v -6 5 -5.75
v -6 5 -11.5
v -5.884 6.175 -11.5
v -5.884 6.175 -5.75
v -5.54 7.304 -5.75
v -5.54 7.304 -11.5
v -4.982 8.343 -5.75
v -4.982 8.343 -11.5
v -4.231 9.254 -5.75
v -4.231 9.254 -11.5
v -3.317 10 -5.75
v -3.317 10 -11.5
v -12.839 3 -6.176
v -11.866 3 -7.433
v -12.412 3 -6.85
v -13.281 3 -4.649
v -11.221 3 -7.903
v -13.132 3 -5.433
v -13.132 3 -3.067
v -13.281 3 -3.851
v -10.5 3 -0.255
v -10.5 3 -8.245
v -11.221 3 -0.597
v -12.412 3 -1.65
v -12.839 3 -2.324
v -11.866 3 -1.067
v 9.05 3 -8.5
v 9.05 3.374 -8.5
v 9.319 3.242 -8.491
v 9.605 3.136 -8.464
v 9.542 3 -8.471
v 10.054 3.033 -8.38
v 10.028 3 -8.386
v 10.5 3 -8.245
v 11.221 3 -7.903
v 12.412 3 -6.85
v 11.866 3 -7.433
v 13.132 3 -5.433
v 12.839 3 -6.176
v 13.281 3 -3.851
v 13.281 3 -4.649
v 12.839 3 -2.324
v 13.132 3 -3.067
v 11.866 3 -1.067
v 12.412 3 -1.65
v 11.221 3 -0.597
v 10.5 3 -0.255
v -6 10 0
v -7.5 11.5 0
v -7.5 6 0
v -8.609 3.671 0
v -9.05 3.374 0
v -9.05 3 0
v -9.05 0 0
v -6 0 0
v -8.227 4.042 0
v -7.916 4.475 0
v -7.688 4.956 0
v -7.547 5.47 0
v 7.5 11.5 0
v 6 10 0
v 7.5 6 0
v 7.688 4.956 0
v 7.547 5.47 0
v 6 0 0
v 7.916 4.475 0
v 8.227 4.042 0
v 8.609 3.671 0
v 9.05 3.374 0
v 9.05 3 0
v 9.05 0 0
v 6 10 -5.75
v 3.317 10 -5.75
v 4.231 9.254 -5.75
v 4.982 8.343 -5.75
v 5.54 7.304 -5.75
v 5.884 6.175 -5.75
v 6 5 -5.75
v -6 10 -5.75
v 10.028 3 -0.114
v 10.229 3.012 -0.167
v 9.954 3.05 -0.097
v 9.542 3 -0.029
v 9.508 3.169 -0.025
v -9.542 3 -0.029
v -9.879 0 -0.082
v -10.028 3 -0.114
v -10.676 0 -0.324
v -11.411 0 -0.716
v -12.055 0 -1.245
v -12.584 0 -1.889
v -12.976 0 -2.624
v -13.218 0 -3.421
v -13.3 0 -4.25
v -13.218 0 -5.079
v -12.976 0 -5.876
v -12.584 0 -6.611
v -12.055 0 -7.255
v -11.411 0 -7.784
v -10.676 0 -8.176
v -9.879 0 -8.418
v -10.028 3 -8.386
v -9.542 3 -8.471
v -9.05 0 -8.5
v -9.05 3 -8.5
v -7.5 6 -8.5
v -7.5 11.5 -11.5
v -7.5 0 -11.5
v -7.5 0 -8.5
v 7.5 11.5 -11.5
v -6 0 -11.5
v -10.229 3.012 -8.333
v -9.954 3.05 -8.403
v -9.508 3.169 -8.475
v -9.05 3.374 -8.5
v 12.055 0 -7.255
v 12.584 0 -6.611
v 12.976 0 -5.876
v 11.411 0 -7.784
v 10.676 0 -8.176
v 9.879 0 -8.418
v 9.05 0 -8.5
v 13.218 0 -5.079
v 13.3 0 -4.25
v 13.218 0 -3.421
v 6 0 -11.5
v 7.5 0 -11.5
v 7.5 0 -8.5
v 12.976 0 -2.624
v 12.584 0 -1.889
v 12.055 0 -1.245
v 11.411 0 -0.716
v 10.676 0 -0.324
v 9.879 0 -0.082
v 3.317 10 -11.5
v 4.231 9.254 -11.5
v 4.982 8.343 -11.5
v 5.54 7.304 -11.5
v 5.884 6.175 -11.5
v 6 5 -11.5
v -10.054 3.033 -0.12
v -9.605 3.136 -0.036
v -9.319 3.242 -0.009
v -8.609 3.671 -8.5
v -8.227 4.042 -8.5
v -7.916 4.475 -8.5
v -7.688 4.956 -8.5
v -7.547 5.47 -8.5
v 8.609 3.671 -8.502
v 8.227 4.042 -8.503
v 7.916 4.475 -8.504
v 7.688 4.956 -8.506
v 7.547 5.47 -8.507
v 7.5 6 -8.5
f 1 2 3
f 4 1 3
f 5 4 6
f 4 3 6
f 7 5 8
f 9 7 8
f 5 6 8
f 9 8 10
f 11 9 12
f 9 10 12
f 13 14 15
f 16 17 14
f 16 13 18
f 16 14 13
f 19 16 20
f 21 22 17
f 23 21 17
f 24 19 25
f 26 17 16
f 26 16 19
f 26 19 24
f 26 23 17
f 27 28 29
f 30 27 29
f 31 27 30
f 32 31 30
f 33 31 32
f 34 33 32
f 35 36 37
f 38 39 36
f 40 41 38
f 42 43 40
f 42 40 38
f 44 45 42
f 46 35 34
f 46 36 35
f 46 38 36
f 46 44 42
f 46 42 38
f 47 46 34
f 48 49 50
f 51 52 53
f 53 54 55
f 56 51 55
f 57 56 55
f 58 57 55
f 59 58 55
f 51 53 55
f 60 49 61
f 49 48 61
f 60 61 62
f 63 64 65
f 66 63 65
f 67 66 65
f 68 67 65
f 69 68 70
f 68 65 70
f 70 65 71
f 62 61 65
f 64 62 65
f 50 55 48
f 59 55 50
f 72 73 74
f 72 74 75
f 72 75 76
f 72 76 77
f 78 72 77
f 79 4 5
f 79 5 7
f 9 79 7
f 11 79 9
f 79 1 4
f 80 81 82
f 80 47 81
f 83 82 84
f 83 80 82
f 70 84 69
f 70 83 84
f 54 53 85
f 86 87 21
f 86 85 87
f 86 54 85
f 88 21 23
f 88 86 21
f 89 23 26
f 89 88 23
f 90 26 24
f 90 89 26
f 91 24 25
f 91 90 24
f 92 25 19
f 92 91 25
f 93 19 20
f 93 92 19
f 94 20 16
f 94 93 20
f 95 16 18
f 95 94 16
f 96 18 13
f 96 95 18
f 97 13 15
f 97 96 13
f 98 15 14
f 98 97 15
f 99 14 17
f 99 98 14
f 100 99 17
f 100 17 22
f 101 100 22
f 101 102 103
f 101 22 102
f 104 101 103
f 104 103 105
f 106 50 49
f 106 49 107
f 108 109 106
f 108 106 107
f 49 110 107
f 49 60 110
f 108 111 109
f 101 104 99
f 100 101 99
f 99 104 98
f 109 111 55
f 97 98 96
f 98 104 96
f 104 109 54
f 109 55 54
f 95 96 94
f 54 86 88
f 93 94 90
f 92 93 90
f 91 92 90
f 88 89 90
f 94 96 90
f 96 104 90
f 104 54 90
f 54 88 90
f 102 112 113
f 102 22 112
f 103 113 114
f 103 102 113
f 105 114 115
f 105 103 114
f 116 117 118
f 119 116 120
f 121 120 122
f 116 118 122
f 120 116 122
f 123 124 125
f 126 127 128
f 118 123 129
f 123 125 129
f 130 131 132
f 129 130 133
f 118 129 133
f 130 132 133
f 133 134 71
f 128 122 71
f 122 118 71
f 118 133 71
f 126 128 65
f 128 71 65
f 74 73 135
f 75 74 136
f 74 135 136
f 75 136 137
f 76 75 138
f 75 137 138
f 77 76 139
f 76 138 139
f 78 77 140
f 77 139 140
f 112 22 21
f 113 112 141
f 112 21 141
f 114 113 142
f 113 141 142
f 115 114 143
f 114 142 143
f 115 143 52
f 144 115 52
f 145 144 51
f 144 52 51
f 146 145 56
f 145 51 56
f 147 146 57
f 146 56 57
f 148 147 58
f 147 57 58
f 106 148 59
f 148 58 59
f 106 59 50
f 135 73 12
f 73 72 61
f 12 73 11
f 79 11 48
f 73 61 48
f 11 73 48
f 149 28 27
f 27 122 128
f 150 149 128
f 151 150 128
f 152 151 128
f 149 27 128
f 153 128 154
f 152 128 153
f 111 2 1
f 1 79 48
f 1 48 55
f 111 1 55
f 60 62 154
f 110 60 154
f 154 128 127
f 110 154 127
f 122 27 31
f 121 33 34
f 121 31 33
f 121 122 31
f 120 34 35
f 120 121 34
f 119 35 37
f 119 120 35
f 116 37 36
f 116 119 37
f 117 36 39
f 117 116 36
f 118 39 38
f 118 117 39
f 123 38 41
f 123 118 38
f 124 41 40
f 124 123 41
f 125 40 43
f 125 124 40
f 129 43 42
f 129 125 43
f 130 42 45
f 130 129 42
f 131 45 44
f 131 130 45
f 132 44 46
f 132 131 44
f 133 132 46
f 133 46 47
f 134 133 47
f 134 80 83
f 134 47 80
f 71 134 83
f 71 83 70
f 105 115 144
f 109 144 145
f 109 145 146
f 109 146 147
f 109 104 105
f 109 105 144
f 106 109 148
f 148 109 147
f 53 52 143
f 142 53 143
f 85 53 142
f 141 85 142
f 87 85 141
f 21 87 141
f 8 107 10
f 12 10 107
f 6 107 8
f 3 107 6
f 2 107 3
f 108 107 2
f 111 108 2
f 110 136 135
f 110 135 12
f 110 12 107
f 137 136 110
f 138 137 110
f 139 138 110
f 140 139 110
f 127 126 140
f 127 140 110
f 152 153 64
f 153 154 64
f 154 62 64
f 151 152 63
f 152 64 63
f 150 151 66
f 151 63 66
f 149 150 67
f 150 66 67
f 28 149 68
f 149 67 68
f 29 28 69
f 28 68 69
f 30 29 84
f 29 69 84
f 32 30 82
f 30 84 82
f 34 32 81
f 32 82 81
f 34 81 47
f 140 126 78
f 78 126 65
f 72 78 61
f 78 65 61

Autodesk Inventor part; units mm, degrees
ref_plane "YZ Plane" through (0, 0, 0) normal (1, 0, 0) x (0, 1, 0)
ref_plane "XZ Plane" through (0, 0, 0) normal (0, 1, 0) x (-1, 0, 0)
ref_plane "XY Plane" through (0, 0, 0) normal (0, 0, 1) x (1, 0, 0)
sketch "Sketch1" plane through (0, 0, 0) normal (0, 1, 0) x (-1, 0, 0)
  line L0 (-7.55, 0) -> (0, 0)
  line L1 (0, -11.5) -> (-7.5, -11.5)
  line L2 (-7.5, 0) -> (-9.05, 0)
  line L3 (-9.05, -8.5) -> (0, -8.5)
  arc A0 (-9.05, 0) -> (-9.05, -8.5) centre (-9.05, -4.25) ccw
  line L4 (-7.55, 0) -> (-7.3, 0)
  line L5 (-7.3, -11.5) -> (-7.5, -11.5)
  line L6 (-7.55, 0) -> (-7.5, 0)
  line L7 (-7.5, -11.5) -> (-7.5, -11.5)
  line L8 (0, 0) -> (0, -11.5)
  line L9 (-7.5, 0) -> (-7.5, -8.5)
  line L10 (7.55, 0) -> (0, 0)
  line L11 (0, -11.5) -> (7.55, -11.5)
  line L12 (7.5, 0) -> (9.05, 0)
  line L13 (9.05, -8.5) -> (0, -8.5)
  arc A1 (9.05, -8.5) -> (9.05, 0) centre (9.05, -4.25) ccw
  line L14 (7.55, 0) -> (7.3, 0)
  line L15 (7.3, -11.5) -> (7.55, -11.5)
  line L16 (7.55, 0) -> (7.5, 0)
  line L17 (7.5, -11.5) -> (7.5, -11.5)
  line L18 (7.5, 0) -> (7.5, -11.5)
  line L19 (7.5, 0) -> (-7.5, 0)
  line L20 (-7.5, 0) -> (-7.5, -11.5)
  line L21 (-7.5, -11.5) -> (7.5, -11.5)
  line L22 (7.5, -11.5) -> (7.5, 0)
  line L23 (-7.5, -8.5) -> (-7.5, -11.5)
  point P0 (0, 0)
  point P1 (-7.55, -8.5)
  point P2 (-13.3, -4.25)
  point P3 (7.55, -8.5)
  point P4 (13.3, -4.25)
  point P5 (7.5, -8.5)
  dimension "d3" = 8.5
  dimension "d9" = 5.8
  dimension "d25" = 15
  dimension "d26" = 5.8
  dimension "d27" = 11.5
extrude "Extrusion1" add sketch "Sketch1" along normal blind 11.5 contours L0 L8 L3 L9 | L3 L8 L1 L20 | L10 L18 L13 L8 | L13 L18 L11 L8
sketch "Sketch2" plane through (-7.5, 0, 0) normal (0, 0, 1) x (1, 0, 0)
  line L0 (0, 0) -> (15, 0) projected
  line L1 (1, 0) -> (14, 0)
  line L2 (0, 11.5) -> (15, 11.5) projected
  line L3 (1.5, 0) -> (13.5, 0)
  line L4 (13.5, 0) -> (13.5, 10)
  line L5 (13.5, 10) -> (1.5, 10)
  line L6 (1.5, 10) -> (1.5, 0)
  point P0 (7.5, 0)
  point P1 (14, 10.5)
  point P2 (1, 10.5)
  dimension "d14" = 10.5
  dimension "d28" = 11.5
  dimension "d29" = 12
  dimension "d30" = 10
extrude "Extrusion3" add sketch "Sketch1" along normal blind 3 contours L0 L9 L3 A0 L2
extrude "Extrusion4" add sketch "Sketch1" along normal blind 3 contours L18 L10 L12 A1 L13
fillet "Fillet1" radius 3 1 edges at (-7.5, 3, -4.25)
fillet "Fillet2" radius 3 1 edges at (7.5, 3, -4.25)
extrude "Extrusion5" cut sketch "Sketch2" against normal blind 5.75
sketch "Sketch3" plane through (7.5, 0, -11.5) normal (0, 0, -1) x (-1, 0, 0)
  line L0 (1.5, 0) -> (13.5, 0)
  line L1 (13.5, 0) -> (13.5, 5)
  line L2 (10.8166, 10) -> (4.1834, 10)
  line L3 (1.5, 5) -> (1.5, 0)
  arc A0 (4.1834, 10) -> (1.5, 5) centre (7.5, 5) ccw
  arc A1 (13.5, 5) -> (10.8166, 10) centre (7.5, 5) ccw
  point P0 (7.5, 0)
  point P1 (13.5, 10)
  point P2 (1.5, 10)
  dimension "d33" = 12
  dimension "d34" = 10
extrude "Extrusion6" cut sketch "Sketch3" against normal blind 5.75
sketch "Sketch4" plane through (-7.5, 11.5, 0) normal (0, 0, 1) x (1, 0, 0)
  line L0 (1.5, -1.5) -> (13.5, -1.5) projected
  point P0 (7.5, -11.5)
  dimension "d40" = 10
properties part number "Motor_Bracket"
